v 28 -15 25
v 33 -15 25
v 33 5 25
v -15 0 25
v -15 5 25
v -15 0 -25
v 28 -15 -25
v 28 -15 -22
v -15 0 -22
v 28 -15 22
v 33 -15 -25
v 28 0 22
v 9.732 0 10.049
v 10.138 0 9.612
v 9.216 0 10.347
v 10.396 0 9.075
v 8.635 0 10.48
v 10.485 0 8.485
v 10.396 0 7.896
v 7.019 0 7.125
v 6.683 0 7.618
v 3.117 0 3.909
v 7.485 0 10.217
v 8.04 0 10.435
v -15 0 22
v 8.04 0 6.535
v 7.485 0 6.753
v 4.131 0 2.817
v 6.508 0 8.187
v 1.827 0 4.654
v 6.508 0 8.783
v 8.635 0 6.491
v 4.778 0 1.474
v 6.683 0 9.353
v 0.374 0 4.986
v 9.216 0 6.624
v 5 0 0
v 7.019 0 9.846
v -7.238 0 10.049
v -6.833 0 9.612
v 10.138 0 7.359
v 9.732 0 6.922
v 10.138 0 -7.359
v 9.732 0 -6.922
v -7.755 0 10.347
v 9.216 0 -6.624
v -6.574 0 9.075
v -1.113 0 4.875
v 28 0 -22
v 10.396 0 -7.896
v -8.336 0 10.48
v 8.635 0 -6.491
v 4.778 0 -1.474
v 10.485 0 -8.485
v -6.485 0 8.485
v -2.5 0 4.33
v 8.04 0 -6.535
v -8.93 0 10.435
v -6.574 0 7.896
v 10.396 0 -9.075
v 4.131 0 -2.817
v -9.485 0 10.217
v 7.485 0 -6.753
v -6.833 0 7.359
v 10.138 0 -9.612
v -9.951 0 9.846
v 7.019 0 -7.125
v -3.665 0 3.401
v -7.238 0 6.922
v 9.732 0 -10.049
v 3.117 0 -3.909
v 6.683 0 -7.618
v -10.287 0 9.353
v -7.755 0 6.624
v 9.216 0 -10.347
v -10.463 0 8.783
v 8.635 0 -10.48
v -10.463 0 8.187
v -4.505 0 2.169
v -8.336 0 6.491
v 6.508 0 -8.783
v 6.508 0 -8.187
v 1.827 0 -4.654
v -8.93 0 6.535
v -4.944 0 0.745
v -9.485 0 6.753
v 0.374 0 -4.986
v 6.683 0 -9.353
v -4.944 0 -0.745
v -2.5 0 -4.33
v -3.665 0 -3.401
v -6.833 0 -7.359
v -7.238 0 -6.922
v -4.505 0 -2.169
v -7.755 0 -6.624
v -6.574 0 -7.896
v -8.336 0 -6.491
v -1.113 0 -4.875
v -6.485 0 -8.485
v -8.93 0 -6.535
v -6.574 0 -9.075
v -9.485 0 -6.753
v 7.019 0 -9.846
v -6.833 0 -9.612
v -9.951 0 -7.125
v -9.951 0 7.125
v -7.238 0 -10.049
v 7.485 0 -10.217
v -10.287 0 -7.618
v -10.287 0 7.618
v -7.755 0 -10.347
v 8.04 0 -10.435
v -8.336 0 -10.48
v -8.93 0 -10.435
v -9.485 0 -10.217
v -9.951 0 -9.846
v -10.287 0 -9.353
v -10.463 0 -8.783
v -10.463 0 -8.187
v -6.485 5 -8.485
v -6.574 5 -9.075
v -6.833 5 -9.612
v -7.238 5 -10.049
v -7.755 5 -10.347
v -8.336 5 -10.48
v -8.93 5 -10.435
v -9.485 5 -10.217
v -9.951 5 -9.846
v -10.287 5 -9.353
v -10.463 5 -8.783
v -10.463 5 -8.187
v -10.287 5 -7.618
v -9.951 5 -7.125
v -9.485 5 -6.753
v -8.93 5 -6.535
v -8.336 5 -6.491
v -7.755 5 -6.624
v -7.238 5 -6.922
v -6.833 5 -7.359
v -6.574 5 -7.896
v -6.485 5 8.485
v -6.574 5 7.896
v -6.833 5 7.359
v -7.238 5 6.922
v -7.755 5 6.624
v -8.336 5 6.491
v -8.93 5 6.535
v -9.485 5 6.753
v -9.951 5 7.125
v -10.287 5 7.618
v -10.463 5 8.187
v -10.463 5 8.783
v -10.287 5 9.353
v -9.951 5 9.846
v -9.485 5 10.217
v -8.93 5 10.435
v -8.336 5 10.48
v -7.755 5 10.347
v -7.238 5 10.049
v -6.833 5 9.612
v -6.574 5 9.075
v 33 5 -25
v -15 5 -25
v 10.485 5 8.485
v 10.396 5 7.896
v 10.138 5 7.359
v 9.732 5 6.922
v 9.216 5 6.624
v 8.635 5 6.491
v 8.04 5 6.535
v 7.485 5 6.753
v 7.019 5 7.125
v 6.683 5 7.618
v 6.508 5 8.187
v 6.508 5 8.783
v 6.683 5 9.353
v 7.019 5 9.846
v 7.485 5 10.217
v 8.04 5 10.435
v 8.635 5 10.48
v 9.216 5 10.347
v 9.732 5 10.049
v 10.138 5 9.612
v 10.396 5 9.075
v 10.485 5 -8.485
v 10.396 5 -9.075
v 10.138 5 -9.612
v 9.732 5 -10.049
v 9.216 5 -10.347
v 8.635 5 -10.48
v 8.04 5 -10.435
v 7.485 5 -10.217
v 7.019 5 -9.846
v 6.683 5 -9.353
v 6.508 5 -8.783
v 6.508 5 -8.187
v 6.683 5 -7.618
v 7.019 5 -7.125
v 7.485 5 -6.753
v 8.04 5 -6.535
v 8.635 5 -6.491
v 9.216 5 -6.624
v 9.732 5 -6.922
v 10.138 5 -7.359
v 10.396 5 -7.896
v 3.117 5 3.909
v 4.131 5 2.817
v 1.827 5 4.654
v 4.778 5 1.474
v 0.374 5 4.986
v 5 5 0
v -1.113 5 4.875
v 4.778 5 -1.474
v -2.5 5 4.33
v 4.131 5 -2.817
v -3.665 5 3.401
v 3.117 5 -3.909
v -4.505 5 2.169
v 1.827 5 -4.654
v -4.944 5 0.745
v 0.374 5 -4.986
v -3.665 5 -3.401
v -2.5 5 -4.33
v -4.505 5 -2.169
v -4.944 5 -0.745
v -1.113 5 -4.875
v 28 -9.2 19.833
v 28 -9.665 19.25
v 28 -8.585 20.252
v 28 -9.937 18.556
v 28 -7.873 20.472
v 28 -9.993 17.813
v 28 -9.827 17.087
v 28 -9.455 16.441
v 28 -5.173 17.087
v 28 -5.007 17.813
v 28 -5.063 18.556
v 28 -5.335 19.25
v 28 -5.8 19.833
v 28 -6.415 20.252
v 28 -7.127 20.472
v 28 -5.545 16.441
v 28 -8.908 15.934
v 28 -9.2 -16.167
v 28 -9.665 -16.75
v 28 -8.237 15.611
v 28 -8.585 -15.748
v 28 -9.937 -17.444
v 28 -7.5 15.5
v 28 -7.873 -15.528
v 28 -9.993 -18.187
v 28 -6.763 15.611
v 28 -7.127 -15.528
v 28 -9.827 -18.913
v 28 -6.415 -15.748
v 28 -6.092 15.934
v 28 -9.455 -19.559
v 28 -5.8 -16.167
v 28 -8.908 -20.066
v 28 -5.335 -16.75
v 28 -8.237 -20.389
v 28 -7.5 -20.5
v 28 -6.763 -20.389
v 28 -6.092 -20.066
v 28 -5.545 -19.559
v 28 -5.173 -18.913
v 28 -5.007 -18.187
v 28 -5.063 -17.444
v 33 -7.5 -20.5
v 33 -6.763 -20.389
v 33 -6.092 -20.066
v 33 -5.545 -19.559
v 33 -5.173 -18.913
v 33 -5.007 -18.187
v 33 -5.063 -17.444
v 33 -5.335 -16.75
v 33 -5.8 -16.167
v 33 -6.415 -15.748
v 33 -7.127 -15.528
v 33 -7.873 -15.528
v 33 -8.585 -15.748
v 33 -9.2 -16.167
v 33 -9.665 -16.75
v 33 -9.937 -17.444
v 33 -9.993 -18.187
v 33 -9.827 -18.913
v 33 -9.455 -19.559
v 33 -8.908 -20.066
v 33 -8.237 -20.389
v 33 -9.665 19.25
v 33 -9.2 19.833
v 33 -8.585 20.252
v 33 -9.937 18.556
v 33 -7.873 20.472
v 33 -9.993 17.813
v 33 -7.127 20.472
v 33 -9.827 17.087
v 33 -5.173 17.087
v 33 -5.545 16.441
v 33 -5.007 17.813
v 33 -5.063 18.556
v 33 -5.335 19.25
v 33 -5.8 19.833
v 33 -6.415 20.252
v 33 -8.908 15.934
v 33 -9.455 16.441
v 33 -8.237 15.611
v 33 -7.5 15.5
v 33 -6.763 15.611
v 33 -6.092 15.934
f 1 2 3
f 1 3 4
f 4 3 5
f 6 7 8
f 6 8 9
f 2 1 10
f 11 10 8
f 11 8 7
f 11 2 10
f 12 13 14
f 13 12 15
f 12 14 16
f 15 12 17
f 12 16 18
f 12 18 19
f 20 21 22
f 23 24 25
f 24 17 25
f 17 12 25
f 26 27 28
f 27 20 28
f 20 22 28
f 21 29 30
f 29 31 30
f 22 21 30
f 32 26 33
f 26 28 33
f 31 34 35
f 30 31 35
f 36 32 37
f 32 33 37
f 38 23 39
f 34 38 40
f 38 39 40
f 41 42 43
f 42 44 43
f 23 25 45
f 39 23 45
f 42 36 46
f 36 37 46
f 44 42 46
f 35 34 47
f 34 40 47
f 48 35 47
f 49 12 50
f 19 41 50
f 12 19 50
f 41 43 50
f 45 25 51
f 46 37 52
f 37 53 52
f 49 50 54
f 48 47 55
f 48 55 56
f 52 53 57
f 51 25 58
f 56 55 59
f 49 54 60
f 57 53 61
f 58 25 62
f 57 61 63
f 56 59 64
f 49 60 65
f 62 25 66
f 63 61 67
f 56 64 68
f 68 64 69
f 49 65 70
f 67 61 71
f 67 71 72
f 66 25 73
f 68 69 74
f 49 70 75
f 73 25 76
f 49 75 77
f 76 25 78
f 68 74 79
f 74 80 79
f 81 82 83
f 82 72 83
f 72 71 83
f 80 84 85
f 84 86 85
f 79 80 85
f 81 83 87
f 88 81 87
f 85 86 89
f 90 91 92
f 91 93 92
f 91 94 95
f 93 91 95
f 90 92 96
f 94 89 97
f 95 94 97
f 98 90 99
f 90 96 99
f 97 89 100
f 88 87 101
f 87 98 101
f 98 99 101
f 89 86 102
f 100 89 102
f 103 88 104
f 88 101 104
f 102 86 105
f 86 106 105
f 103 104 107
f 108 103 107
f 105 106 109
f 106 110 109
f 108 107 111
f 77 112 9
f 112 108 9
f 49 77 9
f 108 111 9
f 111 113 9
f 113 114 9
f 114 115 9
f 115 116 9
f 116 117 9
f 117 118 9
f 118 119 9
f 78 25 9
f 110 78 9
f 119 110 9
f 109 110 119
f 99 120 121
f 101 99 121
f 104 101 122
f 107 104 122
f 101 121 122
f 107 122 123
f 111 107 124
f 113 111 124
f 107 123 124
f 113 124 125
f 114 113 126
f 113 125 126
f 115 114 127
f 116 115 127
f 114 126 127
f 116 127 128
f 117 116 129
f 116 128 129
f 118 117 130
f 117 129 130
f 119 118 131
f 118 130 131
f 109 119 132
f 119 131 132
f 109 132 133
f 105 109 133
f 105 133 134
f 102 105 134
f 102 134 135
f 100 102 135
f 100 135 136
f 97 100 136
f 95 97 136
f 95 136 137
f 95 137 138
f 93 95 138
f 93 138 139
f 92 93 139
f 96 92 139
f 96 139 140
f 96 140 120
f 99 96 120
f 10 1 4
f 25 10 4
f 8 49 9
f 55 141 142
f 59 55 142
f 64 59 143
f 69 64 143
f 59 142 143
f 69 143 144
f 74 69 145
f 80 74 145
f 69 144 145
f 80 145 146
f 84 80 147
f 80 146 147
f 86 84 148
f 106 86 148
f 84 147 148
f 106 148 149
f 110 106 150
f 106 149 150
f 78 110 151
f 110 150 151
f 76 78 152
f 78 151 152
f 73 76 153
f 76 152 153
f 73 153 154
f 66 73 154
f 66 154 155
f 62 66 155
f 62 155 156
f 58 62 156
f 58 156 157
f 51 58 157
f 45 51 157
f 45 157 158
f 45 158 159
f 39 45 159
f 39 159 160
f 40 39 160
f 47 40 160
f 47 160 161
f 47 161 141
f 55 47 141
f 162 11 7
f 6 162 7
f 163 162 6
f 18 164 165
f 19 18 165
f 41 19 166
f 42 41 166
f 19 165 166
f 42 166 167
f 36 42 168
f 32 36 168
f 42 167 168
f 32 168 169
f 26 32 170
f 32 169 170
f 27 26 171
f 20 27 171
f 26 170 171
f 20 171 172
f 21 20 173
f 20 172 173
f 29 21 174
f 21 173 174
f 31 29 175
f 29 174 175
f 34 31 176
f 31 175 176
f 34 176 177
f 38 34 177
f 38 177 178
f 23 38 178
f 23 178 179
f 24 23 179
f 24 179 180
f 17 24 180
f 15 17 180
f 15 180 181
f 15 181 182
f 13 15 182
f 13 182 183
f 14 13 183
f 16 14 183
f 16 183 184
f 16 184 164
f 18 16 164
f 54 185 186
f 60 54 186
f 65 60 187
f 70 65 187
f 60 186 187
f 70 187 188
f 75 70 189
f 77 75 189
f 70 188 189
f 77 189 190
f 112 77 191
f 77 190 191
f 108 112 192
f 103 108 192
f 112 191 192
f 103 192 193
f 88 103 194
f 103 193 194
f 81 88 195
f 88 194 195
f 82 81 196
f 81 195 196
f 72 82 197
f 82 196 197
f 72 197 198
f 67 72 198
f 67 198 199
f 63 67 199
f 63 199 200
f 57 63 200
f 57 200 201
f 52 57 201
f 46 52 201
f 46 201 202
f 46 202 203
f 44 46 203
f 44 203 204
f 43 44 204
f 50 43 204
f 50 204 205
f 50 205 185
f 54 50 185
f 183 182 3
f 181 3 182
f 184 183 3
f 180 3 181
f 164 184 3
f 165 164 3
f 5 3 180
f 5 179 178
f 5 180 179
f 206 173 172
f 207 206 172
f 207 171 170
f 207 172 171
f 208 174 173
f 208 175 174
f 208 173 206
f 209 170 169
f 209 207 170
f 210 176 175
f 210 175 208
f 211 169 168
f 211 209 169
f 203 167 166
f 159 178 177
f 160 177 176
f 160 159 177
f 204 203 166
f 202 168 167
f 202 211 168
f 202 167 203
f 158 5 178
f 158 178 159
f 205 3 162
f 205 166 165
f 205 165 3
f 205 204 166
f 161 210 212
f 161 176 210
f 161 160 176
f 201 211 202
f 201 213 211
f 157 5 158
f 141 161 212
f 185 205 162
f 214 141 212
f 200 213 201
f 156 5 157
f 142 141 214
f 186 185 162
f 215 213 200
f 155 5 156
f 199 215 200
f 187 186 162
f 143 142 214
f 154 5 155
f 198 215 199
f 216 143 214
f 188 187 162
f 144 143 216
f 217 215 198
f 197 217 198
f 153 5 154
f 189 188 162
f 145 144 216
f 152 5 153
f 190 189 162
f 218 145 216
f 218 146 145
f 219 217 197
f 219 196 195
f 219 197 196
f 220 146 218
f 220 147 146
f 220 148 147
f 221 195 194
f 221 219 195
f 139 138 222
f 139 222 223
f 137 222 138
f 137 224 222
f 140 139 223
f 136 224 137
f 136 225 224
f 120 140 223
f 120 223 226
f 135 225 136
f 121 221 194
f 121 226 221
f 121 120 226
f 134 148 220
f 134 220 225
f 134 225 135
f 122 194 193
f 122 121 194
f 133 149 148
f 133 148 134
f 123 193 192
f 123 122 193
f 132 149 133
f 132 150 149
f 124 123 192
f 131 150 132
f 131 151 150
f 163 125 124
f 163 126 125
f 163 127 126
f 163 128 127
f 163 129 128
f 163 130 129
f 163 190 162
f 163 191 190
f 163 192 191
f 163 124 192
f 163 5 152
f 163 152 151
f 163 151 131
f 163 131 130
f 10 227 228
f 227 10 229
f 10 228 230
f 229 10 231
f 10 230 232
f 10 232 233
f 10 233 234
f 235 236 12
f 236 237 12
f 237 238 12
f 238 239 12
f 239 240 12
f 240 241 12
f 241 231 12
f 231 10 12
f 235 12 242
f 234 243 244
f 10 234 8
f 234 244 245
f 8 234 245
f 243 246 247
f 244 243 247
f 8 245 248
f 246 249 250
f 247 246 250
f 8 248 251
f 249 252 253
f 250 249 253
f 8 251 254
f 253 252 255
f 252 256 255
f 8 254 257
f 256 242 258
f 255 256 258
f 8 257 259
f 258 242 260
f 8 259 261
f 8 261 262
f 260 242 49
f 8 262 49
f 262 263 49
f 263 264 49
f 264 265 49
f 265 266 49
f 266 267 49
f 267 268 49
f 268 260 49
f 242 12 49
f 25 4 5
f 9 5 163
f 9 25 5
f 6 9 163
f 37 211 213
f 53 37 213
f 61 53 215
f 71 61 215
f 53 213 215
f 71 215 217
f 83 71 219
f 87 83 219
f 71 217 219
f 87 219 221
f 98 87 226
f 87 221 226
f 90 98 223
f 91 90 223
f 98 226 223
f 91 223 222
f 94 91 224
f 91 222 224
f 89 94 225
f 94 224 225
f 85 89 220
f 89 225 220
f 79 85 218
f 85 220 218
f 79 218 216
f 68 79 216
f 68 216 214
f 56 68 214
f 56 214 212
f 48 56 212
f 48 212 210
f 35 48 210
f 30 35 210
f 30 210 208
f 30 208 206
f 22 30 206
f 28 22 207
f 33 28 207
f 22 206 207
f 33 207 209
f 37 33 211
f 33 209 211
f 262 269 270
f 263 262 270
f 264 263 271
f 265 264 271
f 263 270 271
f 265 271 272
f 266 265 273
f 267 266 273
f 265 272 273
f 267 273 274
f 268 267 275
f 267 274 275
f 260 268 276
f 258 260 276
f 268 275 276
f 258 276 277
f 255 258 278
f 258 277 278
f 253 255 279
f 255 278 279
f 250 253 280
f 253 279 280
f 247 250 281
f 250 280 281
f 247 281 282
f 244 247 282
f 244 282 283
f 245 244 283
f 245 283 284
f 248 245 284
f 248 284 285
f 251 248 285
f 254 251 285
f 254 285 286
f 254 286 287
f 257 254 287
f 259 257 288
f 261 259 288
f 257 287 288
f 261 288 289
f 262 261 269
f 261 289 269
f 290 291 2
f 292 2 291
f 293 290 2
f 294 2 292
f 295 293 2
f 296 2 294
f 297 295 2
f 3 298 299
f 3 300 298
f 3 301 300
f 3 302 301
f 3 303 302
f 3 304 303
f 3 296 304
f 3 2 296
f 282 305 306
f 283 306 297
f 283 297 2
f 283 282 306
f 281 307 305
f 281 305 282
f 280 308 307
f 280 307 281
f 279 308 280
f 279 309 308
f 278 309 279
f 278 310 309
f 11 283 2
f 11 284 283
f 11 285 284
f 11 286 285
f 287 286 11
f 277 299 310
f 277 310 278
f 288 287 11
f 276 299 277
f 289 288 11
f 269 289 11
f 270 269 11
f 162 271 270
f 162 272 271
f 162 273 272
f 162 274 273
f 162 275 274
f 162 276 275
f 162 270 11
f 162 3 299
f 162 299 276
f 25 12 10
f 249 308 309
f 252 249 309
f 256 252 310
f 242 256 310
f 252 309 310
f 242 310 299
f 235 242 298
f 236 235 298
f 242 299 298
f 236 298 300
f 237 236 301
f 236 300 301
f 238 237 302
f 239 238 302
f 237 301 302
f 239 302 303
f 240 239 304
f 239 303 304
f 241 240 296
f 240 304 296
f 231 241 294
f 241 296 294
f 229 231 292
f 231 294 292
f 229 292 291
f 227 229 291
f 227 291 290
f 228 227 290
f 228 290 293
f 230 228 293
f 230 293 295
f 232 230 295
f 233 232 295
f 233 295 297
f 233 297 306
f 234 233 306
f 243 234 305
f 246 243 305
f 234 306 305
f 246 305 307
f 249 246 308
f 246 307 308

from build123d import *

# Parameters (mm, degrees)
SKETCH1_W           = 30
SKETCH1_H           = 50
BOSS_EXTRUDE1_DEPTH = 5
SKETCH2_R           = 5
CUT_EXTRUDE1_DEPTH  = 5
SKETCH3_R           = 2
CUT_EXTRUDE2_DEPTH  = 10
SKETCH4_W           = 50
SKETCH4_H           = 5
BOSS_EXTRUDE2_DEPTH = 18
SKETCH5_W           = 50
SKETCH5_H           = 20
BOSS_EXTRUDE3_DEPTH = 5
SKETCH6_R           = 2.5
CUT_EXTRUDE3_DEPTH  = 5
BOSS_EXTRUDE4_DEPTH = 3


with BuildPart() as part:
    # Sketch1 → Boss-Extrude1 (new body)
    with BuildSketch(Plane(origin=(0, 0, 0), x_dir=(1, 0, 0), z_dir=(0, 1, 0))):
        Rectangle(SKETCH1_W, SKETCH1_H)
    extrude(amount=BOSS_EXTRUDE1_DEPTH)

    # Sketch2 → Cut-Extrude1 (cut)
    with BuildSketch(Plane(origin=(0, 5, 0), x_dir=(1, 0, 0), z_dir=(0, 1, 0))):
        Circle(SKETCH2_R)
    extrude(amount=-CUT_EXTRUDE1_DEPTH, mode=Mode.SUBTRACT)

    # Sketch3 → Cut-Extrude2 (cut)
    with BuildSketch(Plane(origin=(0, 5, 0), x_dir=(1, 0, 0), z_dir=(0, 1, 0))):
        with Locations((-8.485281374, 8.485281374)):
            Circle(SKETCH3_R)
        with Locations((8.485281374, 8.485281374)):
            Circle(SKETCH3_R)
        with Locations((-8.485281374, -8.485281374)):
            Circle(SKETCH3_R)
        with Locations((8.485281374, -8.485281374)):
            Circle(SKETCH3_R)
    extrude(amount=-CUT_EXTRUDE2_DEPTH, mode=Mode.SUBTRACT)

    # Sketch4 → Boss-Extrude2 (add)
    with BuildSketch(Plane(origin=(15, 0, 0), x_dir=(0, 0, -1), z_dir=(1, 0, 0))):
        with Locations((0, 2.5)):
            Rectangle(SKETCH4_W, SKETCH4_H)
    extrude(amount=BOSS_EXTRUDE2_DEPTH)

    # Sketch5 → Boss-Extrude3 (add)
    with BuildSketch(Plane(origin=(33, 0, 0), x_dir=(0, 0, -1), z_dir=(1, 0, 0))):
        with Locations((0, -5)):
            Rectangle(SKETCH5_W, SKETCH5_H)
    extrude(amount=-BOSS_EXTRUDE3_DEPTH)

    # Sketch6 → Cut-Extrude3 (cut)
    with BuildSketch(Plane(origin=(33, 0, 0), x_dir=(0, 0, -1), z_dir=(1, 0, 0))):
        with Locations((18, -7.5)):
            Circle(SKETCH6_R)
        with Locations((-18, -7.5)):
            Circle(SKETCH6_R)
    extrude(amount=-CUT_EXTRUDE3_DEPTH, mode=Mode.SUBTRACT)

    # Sketch7 → Boss-Extrude4 (add)
    with BuildSketch(Plane.XY.offset(25)):
        Polygon((28, -15), (-15, 0), (28, 0), align=None)
    boss_extrude4 = extrude(amount=-BOSS_EXTRUDE4_DEPTH)

    # Mirror1: Boss-Extrude4 across plane
    add(boss_extrude4.mirror(Plane.XY))


solid = part.part
